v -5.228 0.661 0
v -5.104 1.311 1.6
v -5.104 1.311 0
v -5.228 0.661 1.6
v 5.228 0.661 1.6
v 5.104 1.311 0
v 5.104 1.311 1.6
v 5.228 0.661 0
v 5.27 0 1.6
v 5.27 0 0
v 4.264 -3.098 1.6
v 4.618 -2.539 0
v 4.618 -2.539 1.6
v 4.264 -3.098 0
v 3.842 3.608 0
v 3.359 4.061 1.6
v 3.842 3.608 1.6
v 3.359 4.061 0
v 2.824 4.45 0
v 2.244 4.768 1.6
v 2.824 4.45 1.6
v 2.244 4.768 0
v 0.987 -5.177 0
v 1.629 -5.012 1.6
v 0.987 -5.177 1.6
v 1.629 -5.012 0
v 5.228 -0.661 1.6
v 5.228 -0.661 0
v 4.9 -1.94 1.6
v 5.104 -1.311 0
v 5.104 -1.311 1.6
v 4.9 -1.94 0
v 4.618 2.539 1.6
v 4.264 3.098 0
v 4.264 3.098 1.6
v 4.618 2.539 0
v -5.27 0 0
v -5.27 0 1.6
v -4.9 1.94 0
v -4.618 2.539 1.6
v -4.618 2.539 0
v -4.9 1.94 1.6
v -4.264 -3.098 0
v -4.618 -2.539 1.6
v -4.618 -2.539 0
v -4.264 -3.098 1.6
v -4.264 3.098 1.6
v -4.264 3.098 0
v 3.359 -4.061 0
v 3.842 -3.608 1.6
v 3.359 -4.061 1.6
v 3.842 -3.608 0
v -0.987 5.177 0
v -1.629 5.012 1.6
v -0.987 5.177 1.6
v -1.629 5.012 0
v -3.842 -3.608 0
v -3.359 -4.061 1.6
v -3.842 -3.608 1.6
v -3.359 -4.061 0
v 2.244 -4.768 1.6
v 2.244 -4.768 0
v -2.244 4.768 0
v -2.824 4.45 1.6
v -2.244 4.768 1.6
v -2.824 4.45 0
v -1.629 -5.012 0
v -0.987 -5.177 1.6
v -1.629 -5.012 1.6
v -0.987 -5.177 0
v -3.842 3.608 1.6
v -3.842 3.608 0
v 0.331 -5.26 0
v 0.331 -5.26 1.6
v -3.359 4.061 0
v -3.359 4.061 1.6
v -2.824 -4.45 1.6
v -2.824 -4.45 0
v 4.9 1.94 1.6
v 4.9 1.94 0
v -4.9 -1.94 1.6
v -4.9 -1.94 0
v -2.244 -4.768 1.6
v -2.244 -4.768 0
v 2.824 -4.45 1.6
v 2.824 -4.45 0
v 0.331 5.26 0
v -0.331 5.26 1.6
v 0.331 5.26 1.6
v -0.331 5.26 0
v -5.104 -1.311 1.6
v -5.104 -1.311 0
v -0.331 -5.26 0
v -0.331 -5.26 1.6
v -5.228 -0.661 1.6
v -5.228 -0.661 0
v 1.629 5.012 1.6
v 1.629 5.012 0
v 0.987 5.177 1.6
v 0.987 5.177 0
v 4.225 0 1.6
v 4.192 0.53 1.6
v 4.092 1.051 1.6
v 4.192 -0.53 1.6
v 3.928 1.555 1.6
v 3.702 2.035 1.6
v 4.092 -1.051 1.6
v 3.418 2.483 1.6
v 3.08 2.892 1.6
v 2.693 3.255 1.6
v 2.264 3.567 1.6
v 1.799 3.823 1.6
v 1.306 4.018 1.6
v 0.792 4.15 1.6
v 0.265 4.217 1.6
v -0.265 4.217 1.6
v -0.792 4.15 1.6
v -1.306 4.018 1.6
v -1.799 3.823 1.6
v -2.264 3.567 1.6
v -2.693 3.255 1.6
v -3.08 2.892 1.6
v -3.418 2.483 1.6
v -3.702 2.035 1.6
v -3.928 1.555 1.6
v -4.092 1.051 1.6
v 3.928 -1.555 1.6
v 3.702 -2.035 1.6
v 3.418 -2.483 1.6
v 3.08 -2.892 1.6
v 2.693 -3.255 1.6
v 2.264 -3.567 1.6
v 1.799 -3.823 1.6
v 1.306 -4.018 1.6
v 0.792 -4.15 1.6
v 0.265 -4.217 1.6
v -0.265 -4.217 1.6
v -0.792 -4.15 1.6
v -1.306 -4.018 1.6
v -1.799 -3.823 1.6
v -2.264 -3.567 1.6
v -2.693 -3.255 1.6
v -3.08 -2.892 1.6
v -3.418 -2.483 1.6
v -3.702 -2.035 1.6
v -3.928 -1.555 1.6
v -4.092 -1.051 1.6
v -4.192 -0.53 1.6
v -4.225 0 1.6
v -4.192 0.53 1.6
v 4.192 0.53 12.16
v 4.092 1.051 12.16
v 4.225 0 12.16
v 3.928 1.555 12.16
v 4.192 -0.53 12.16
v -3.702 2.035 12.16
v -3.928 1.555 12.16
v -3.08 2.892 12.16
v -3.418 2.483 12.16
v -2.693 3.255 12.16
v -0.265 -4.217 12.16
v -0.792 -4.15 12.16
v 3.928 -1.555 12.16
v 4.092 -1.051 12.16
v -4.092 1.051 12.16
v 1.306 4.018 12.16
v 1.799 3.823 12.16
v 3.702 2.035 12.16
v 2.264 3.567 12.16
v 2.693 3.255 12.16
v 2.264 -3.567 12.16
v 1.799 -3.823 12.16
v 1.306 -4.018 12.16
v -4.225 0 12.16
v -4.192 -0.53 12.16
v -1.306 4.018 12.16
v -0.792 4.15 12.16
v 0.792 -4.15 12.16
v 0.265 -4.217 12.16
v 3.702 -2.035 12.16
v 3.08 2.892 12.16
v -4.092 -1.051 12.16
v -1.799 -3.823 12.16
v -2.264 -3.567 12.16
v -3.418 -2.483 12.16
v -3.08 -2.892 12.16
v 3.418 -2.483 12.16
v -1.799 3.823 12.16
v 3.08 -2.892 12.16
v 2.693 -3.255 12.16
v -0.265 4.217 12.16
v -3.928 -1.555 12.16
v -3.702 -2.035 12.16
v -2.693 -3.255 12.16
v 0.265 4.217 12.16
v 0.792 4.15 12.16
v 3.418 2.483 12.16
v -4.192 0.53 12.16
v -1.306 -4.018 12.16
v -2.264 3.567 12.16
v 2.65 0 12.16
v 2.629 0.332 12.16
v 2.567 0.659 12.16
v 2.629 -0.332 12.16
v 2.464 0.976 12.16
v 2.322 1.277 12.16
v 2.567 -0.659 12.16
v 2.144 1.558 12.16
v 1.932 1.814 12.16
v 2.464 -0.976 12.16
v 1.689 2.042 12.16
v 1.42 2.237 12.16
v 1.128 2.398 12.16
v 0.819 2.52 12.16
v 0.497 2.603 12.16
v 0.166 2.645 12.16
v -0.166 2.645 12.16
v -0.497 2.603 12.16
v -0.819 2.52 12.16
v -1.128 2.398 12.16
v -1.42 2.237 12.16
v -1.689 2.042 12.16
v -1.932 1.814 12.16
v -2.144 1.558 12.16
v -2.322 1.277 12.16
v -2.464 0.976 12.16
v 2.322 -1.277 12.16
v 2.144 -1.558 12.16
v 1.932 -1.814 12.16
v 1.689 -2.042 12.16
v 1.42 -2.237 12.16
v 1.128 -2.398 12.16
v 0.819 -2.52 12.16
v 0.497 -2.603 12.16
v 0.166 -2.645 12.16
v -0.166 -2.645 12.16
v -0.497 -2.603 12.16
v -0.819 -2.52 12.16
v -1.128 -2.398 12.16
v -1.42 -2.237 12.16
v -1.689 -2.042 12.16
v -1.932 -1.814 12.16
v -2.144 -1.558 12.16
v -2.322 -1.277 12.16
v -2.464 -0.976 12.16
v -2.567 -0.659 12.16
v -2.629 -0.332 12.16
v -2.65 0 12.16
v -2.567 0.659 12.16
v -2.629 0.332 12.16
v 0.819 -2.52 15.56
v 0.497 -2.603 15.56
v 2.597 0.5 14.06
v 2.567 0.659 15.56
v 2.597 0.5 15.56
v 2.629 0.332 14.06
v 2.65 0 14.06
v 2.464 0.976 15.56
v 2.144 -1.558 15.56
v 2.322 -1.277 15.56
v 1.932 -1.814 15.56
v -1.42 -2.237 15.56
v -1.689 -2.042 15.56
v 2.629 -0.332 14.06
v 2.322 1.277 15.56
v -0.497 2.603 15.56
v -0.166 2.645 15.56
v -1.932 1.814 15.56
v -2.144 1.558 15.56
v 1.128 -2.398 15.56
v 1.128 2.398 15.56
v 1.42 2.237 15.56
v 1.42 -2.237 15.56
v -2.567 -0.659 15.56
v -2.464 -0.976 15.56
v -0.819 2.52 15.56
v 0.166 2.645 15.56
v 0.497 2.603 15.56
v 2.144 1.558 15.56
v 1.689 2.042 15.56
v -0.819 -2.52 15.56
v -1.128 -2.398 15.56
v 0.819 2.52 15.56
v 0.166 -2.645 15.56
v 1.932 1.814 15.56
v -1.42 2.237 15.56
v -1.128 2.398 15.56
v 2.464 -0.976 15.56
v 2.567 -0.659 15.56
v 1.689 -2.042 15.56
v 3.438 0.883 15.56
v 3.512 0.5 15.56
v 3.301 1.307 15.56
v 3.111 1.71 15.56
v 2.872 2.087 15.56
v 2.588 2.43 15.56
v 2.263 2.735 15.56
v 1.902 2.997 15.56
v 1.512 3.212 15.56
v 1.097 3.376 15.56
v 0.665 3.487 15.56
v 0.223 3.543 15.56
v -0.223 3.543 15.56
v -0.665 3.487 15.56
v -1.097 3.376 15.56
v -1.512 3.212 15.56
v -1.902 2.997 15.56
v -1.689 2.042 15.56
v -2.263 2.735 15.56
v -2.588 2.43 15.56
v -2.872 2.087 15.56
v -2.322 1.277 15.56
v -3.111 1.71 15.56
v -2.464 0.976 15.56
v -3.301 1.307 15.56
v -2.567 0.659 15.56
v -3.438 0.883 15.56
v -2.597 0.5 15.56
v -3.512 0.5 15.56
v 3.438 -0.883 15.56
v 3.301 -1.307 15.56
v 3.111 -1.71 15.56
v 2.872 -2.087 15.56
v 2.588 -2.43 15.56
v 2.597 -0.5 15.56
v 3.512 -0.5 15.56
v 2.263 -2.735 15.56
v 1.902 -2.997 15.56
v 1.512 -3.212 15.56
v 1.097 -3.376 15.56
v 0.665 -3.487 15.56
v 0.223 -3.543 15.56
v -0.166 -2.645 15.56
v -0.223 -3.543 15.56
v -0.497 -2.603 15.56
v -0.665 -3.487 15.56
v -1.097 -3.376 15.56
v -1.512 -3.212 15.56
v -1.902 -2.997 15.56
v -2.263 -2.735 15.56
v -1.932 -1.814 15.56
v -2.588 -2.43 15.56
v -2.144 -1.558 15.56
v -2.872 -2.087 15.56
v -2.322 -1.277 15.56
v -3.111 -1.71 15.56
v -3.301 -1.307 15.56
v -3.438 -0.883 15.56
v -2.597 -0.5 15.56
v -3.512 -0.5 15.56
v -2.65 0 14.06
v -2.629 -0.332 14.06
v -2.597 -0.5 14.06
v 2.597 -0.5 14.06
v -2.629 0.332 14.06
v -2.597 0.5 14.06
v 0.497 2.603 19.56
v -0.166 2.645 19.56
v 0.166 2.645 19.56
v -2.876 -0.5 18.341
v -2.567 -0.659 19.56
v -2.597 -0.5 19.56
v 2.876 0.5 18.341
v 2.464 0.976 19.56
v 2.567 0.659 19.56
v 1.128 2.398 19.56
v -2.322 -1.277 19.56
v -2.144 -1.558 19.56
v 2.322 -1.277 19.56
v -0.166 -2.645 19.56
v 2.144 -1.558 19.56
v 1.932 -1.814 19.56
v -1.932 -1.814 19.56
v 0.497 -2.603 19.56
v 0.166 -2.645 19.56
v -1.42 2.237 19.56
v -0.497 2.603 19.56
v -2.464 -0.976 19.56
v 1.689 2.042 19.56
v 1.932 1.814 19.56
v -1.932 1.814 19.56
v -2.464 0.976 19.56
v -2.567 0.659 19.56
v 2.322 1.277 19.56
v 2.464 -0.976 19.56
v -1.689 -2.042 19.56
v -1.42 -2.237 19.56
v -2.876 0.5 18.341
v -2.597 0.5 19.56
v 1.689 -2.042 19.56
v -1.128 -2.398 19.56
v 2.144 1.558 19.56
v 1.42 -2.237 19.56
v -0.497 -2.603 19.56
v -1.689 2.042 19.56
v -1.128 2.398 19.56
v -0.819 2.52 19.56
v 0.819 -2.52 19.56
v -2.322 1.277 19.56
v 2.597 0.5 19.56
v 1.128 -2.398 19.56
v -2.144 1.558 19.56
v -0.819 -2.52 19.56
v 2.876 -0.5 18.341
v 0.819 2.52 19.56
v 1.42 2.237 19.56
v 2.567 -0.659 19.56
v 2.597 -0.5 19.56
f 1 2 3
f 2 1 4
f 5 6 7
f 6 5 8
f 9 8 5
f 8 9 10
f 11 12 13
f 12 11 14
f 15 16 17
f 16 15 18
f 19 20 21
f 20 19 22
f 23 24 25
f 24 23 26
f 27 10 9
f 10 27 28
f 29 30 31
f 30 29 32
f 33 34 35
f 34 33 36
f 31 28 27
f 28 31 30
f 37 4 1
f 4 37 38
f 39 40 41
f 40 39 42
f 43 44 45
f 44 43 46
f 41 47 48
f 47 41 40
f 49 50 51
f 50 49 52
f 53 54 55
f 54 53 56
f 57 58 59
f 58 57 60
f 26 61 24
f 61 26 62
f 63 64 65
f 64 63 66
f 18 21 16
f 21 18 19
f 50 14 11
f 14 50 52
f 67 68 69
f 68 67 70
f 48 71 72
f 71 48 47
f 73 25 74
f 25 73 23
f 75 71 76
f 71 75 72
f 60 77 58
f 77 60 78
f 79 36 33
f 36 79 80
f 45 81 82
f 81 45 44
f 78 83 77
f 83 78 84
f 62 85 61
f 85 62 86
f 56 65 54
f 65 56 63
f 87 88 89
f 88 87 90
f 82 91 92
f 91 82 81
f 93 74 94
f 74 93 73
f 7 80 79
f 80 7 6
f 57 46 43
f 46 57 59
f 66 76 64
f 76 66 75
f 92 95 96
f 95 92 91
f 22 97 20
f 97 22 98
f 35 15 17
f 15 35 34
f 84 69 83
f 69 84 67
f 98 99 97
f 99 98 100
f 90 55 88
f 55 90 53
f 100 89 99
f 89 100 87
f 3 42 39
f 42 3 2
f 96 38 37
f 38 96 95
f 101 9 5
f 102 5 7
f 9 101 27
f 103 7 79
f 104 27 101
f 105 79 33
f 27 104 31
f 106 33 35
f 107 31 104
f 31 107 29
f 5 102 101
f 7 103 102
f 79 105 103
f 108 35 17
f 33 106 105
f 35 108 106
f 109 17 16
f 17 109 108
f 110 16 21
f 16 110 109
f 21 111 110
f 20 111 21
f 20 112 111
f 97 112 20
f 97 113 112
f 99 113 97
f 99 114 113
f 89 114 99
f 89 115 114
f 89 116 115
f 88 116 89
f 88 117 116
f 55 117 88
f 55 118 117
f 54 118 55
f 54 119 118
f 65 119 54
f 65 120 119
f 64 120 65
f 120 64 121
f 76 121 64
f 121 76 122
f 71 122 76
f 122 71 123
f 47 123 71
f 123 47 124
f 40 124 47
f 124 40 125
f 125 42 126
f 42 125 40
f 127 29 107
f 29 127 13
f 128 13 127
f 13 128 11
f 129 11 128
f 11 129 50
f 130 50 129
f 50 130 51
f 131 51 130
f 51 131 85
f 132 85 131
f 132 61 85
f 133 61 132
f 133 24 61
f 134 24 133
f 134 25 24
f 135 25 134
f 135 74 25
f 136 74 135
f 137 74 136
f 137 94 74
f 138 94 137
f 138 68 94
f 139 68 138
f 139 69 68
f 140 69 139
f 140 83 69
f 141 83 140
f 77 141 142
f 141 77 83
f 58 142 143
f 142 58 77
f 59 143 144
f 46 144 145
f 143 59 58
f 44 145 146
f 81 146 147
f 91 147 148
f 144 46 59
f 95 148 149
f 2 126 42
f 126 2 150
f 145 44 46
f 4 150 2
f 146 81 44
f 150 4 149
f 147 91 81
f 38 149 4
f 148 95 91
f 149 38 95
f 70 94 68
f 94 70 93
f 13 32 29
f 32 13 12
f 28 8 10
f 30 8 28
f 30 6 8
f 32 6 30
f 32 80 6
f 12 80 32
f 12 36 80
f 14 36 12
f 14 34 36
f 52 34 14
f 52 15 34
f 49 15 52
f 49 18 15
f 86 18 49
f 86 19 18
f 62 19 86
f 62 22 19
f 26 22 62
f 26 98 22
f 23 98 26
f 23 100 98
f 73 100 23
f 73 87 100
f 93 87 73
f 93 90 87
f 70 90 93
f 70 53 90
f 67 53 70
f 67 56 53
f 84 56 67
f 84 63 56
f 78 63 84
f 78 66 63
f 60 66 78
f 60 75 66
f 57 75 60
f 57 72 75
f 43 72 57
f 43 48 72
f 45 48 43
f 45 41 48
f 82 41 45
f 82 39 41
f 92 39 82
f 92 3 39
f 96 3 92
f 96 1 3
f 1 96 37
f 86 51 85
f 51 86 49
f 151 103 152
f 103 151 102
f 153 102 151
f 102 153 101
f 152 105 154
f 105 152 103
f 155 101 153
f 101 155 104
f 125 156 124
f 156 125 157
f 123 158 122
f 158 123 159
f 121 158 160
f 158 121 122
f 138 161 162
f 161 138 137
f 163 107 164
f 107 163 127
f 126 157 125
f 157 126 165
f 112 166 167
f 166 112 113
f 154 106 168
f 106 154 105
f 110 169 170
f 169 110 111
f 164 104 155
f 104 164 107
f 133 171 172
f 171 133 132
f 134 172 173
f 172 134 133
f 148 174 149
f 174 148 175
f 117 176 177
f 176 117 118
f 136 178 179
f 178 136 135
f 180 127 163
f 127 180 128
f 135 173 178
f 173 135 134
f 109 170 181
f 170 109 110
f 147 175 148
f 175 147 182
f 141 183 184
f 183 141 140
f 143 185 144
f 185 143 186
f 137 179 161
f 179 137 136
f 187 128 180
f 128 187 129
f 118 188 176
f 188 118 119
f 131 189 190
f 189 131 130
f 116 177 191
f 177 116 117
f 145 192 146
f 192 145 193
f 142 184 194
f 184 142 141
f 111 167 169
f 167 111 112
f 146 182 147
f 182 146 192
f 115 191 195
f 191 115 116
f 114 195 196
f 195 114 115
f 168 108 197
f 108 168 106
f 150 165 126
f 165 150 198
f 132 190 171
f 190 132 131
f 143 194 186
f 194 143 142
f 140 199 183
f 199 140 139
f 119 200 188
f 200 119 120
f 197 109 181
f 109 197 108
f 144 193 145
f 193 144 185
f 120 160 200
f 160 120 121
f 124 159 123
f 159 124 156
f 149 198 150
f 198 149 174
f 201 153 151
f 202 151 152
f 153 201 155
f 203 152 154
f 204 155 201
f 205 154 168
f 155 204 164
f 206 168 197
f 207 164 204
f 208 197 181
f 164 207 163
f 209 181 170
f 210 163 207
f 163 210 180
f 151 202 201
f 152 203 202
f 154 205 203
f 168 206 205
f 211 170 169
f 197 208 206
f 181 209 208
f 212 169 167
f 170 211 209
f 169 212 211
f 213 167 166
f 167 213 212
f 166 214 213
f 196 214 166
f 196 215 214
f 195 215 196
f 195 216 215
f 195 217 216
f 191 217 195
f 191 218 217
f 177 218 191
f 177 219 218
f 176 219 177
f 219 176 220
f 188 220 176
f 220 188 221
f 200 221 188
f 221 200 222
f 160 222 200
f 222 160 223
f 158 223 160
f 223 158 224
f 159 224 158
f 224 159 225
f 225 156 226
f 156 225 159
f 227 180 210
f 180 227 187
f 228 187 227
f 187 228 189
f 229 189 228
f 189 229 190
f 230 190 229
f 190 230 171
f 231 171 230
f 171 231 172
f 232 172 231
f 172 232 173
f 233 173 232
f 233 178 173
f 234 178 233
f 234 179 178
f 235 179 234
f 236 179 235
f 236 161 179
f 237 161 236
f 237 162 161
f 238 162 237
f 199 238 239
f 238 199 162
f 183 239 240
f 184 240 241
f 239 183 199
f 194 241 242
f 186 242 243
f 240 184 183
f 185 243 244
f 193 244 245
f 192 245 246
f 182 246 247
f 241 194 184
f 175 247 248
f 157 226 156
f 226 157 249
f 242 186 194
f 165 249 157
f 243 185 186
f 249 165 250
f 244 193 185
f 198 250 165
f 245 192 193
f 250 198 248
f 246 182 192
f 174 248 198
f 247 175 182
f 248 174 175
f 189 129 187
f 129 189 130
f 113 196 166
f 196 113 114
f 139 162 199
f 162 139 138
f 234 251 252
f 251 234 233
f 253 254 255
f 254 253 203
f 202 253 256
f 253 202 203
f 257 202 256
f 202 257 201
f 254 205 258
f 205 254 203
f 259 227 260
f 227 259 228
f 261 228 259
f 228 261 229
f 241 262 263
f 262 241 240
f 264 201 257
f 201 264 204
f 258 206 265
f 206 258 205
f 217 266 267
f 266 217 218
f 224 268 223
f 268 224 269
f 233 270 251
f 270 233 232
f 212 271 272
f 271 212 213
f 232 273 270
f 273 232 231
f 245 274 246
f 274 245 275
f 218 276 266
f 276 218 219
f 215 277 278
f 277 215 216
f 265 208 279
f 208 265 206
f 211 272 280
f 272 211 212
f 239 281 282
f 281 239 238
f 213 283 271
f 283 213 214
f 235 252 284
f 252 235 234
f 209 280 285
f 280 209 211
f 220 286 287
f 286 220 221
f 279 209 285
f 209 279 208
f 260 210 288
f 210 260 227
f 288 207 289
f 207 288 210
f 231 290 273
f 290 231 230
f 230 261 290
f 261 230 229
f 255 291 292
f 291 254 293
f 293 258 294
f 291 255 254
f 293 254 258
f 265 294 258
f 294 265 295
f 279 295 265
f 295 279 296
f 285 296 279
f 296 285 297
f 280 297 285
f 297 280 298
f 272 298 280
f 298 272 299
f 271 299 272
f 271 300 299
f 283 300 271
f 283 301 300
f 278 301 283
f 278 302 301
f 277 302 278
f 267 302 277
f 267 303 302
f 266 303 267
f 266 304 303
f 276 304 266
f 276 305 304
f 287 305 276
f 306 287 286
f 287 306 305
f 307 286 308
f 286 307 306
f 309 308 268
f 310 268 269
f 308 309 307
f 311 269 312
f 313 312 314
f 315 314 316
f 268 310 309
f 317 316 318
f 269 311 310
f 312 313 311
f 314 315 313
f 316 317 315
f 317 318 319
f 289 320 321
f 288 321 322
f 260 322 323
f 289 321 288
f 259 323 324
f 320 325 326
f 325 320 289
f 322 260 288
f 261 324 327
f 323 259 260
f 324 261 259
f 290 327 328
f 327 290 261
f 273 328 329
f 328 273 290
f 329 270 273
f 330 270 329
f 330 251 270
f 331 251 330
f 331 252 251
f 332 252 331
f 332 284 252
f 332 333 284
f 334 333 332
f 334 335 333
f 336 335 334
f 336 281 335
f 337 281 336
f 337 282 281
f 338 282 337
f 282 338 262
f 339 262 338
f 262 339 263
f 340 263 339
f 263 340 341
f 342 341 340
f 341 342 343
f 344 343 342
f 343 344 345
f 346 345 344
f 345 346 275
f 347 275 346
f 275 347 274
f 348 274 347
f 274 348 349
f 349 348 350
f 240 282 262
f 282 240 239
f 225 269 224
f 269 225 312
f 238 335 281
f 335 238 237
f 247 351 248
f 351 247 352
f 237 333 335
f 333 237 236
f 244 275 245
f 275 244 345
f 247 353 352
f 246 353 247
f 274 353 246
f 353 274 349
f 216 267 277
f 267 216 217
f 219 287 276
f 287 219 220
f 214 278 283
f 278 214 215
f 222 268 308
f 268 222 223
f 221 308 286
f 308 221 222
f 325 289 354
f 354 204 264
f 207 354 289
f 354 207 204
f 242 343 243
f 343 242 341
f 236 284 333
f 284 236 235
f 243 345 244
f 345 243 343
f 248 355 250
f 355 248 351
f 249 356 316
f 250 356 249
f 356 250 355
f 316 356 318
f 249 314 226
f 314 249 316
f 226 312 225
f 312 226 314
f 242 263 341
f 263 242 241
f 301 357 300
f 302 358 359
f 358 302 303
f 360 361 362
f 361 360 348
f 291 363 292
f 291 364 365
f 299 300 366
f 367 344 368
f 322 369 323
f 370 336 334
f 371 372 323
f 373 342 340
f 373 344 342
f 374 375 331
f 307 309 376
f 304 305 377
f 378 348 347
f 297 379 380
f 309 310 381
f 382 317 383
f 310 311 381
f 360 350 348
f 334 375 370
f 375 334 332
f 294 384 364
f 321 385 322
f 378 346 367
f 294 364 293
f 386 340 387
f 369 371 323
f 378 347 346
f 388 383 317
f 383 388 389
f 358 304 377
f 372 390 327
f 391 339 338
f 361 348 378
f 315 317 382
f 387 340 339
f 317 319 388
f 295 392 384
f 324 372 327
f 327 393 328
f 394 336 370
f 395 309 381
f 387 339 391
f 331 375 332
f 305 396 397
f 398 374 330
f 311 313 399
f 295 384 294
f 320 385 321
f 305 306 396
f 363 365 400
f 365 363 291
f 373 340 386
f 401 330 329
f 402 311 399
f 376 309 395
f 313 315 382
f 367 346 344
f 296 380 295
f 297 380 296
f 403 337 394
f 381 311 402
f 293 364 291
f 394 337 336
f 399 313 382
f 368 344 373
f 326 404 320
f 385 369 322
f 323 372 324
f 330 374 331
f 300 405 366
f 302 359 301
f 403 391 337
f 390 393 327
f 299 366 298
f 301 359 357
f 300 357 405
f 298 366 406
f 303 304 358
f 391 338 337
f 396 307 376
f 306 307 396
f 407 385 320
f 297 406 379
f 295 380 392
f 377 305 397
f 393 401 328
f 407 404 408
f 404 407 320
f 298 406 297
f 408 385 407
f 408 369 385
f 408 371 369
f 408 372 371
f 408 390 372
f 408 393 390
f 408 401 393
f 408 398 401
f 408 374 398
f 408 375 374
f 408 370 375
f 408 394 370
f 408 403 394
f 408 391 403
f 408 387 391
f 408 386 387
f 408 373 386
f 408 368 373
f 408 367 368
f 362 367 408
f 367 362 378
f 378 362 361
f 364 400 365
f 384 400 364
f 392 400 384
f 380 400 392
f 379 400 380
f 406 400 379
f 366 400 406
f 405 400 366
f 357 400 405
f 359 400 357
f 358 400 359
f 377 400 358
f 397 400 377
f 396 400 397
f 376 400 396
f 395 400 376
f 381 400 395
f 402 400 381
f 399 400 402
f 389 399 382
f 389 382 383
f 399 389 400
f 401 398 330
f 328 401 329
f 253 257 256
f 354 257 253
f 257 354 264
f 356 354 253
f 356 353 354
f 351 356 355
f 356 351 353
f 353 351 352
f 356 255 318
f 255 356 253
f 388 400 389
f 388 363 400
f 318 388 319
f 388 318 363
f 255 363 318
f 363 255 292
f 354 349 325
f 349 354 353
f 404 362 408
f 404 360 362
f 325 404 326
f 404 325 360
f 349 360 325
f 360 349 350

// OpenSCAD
// file: parametric_peg.scad
$fn=50;
//Whirlpool refrigerator drawer bearing peg:
cap_depth=1.6;
cap_diam=10.54;
bearing_depth=12.16;
bearing_diam=8.45;
lag_diam=5.3;
lag_depth=15.56;
retain_depth=4;
retain_max_diam=7.1;
retain_slit = 1;
retain_slit_depth = retain_depth+1.5;

module parametric_peg(cap_depth, //How tall is the cap
					cap_diam, //diameter of the cap
					bearing_depth, //height of the bearing section
					bearing_diam, //diameter of the bearing
					lag_diam, //diameter of the lag section
					lag_depth, //length of the lag section
					retain_depth, //length of the retaining barb
					retain_max_diam, //max diam of the barb. (min is lag_diam
					retain_slit, //How wide the slit is
					retain_slit_depth) { //How long the slit is, from tip to end of slit
	difference() {
		union() {
			//cap
			cylinder(d=cap_diam, h=cap_depth);
			//bearing
			cylinder(d=bearing_diam, h=bearing_depth);
			//lag
			cylinder(d=lag_diam, h=lag_depth);
			//retain
			translate([0,0,lag_depth]) cylinder(r1=retain_max_diam/2, r2=lag_diam/2, h=retain_depth);
		}
		translate([-retain_max_diam/2,-retain_slit/2,lag_depth+retain_depth-retain_slit_depth]) cube([retain_max_diam, retain_slit, retain_slit_depth]);
	}
}
// main file
use <parametric_peg.scad>;

//Whirlpool refrigerator drawer bearing peg:
cap_depth=1.6;
cap_diam=10.54;
bearing_depth=12.16;
bearing_diam=8.45;
lag_diam=5.3;
lag_depth=15.56;
retain_depth=4;
retain_max_diam=7.1;
retain_slit = 1;
retain_slit_depth = retain_depth+1.5;

parametric_peg(cap_depth,
					cap_diam,
					bearing_depth,
					bearing_diam,
					lag_diam,
					lag_depth,
					retain_depth,
					retain_max_diam,
					retain_slit,
					retain_slit_depth);
